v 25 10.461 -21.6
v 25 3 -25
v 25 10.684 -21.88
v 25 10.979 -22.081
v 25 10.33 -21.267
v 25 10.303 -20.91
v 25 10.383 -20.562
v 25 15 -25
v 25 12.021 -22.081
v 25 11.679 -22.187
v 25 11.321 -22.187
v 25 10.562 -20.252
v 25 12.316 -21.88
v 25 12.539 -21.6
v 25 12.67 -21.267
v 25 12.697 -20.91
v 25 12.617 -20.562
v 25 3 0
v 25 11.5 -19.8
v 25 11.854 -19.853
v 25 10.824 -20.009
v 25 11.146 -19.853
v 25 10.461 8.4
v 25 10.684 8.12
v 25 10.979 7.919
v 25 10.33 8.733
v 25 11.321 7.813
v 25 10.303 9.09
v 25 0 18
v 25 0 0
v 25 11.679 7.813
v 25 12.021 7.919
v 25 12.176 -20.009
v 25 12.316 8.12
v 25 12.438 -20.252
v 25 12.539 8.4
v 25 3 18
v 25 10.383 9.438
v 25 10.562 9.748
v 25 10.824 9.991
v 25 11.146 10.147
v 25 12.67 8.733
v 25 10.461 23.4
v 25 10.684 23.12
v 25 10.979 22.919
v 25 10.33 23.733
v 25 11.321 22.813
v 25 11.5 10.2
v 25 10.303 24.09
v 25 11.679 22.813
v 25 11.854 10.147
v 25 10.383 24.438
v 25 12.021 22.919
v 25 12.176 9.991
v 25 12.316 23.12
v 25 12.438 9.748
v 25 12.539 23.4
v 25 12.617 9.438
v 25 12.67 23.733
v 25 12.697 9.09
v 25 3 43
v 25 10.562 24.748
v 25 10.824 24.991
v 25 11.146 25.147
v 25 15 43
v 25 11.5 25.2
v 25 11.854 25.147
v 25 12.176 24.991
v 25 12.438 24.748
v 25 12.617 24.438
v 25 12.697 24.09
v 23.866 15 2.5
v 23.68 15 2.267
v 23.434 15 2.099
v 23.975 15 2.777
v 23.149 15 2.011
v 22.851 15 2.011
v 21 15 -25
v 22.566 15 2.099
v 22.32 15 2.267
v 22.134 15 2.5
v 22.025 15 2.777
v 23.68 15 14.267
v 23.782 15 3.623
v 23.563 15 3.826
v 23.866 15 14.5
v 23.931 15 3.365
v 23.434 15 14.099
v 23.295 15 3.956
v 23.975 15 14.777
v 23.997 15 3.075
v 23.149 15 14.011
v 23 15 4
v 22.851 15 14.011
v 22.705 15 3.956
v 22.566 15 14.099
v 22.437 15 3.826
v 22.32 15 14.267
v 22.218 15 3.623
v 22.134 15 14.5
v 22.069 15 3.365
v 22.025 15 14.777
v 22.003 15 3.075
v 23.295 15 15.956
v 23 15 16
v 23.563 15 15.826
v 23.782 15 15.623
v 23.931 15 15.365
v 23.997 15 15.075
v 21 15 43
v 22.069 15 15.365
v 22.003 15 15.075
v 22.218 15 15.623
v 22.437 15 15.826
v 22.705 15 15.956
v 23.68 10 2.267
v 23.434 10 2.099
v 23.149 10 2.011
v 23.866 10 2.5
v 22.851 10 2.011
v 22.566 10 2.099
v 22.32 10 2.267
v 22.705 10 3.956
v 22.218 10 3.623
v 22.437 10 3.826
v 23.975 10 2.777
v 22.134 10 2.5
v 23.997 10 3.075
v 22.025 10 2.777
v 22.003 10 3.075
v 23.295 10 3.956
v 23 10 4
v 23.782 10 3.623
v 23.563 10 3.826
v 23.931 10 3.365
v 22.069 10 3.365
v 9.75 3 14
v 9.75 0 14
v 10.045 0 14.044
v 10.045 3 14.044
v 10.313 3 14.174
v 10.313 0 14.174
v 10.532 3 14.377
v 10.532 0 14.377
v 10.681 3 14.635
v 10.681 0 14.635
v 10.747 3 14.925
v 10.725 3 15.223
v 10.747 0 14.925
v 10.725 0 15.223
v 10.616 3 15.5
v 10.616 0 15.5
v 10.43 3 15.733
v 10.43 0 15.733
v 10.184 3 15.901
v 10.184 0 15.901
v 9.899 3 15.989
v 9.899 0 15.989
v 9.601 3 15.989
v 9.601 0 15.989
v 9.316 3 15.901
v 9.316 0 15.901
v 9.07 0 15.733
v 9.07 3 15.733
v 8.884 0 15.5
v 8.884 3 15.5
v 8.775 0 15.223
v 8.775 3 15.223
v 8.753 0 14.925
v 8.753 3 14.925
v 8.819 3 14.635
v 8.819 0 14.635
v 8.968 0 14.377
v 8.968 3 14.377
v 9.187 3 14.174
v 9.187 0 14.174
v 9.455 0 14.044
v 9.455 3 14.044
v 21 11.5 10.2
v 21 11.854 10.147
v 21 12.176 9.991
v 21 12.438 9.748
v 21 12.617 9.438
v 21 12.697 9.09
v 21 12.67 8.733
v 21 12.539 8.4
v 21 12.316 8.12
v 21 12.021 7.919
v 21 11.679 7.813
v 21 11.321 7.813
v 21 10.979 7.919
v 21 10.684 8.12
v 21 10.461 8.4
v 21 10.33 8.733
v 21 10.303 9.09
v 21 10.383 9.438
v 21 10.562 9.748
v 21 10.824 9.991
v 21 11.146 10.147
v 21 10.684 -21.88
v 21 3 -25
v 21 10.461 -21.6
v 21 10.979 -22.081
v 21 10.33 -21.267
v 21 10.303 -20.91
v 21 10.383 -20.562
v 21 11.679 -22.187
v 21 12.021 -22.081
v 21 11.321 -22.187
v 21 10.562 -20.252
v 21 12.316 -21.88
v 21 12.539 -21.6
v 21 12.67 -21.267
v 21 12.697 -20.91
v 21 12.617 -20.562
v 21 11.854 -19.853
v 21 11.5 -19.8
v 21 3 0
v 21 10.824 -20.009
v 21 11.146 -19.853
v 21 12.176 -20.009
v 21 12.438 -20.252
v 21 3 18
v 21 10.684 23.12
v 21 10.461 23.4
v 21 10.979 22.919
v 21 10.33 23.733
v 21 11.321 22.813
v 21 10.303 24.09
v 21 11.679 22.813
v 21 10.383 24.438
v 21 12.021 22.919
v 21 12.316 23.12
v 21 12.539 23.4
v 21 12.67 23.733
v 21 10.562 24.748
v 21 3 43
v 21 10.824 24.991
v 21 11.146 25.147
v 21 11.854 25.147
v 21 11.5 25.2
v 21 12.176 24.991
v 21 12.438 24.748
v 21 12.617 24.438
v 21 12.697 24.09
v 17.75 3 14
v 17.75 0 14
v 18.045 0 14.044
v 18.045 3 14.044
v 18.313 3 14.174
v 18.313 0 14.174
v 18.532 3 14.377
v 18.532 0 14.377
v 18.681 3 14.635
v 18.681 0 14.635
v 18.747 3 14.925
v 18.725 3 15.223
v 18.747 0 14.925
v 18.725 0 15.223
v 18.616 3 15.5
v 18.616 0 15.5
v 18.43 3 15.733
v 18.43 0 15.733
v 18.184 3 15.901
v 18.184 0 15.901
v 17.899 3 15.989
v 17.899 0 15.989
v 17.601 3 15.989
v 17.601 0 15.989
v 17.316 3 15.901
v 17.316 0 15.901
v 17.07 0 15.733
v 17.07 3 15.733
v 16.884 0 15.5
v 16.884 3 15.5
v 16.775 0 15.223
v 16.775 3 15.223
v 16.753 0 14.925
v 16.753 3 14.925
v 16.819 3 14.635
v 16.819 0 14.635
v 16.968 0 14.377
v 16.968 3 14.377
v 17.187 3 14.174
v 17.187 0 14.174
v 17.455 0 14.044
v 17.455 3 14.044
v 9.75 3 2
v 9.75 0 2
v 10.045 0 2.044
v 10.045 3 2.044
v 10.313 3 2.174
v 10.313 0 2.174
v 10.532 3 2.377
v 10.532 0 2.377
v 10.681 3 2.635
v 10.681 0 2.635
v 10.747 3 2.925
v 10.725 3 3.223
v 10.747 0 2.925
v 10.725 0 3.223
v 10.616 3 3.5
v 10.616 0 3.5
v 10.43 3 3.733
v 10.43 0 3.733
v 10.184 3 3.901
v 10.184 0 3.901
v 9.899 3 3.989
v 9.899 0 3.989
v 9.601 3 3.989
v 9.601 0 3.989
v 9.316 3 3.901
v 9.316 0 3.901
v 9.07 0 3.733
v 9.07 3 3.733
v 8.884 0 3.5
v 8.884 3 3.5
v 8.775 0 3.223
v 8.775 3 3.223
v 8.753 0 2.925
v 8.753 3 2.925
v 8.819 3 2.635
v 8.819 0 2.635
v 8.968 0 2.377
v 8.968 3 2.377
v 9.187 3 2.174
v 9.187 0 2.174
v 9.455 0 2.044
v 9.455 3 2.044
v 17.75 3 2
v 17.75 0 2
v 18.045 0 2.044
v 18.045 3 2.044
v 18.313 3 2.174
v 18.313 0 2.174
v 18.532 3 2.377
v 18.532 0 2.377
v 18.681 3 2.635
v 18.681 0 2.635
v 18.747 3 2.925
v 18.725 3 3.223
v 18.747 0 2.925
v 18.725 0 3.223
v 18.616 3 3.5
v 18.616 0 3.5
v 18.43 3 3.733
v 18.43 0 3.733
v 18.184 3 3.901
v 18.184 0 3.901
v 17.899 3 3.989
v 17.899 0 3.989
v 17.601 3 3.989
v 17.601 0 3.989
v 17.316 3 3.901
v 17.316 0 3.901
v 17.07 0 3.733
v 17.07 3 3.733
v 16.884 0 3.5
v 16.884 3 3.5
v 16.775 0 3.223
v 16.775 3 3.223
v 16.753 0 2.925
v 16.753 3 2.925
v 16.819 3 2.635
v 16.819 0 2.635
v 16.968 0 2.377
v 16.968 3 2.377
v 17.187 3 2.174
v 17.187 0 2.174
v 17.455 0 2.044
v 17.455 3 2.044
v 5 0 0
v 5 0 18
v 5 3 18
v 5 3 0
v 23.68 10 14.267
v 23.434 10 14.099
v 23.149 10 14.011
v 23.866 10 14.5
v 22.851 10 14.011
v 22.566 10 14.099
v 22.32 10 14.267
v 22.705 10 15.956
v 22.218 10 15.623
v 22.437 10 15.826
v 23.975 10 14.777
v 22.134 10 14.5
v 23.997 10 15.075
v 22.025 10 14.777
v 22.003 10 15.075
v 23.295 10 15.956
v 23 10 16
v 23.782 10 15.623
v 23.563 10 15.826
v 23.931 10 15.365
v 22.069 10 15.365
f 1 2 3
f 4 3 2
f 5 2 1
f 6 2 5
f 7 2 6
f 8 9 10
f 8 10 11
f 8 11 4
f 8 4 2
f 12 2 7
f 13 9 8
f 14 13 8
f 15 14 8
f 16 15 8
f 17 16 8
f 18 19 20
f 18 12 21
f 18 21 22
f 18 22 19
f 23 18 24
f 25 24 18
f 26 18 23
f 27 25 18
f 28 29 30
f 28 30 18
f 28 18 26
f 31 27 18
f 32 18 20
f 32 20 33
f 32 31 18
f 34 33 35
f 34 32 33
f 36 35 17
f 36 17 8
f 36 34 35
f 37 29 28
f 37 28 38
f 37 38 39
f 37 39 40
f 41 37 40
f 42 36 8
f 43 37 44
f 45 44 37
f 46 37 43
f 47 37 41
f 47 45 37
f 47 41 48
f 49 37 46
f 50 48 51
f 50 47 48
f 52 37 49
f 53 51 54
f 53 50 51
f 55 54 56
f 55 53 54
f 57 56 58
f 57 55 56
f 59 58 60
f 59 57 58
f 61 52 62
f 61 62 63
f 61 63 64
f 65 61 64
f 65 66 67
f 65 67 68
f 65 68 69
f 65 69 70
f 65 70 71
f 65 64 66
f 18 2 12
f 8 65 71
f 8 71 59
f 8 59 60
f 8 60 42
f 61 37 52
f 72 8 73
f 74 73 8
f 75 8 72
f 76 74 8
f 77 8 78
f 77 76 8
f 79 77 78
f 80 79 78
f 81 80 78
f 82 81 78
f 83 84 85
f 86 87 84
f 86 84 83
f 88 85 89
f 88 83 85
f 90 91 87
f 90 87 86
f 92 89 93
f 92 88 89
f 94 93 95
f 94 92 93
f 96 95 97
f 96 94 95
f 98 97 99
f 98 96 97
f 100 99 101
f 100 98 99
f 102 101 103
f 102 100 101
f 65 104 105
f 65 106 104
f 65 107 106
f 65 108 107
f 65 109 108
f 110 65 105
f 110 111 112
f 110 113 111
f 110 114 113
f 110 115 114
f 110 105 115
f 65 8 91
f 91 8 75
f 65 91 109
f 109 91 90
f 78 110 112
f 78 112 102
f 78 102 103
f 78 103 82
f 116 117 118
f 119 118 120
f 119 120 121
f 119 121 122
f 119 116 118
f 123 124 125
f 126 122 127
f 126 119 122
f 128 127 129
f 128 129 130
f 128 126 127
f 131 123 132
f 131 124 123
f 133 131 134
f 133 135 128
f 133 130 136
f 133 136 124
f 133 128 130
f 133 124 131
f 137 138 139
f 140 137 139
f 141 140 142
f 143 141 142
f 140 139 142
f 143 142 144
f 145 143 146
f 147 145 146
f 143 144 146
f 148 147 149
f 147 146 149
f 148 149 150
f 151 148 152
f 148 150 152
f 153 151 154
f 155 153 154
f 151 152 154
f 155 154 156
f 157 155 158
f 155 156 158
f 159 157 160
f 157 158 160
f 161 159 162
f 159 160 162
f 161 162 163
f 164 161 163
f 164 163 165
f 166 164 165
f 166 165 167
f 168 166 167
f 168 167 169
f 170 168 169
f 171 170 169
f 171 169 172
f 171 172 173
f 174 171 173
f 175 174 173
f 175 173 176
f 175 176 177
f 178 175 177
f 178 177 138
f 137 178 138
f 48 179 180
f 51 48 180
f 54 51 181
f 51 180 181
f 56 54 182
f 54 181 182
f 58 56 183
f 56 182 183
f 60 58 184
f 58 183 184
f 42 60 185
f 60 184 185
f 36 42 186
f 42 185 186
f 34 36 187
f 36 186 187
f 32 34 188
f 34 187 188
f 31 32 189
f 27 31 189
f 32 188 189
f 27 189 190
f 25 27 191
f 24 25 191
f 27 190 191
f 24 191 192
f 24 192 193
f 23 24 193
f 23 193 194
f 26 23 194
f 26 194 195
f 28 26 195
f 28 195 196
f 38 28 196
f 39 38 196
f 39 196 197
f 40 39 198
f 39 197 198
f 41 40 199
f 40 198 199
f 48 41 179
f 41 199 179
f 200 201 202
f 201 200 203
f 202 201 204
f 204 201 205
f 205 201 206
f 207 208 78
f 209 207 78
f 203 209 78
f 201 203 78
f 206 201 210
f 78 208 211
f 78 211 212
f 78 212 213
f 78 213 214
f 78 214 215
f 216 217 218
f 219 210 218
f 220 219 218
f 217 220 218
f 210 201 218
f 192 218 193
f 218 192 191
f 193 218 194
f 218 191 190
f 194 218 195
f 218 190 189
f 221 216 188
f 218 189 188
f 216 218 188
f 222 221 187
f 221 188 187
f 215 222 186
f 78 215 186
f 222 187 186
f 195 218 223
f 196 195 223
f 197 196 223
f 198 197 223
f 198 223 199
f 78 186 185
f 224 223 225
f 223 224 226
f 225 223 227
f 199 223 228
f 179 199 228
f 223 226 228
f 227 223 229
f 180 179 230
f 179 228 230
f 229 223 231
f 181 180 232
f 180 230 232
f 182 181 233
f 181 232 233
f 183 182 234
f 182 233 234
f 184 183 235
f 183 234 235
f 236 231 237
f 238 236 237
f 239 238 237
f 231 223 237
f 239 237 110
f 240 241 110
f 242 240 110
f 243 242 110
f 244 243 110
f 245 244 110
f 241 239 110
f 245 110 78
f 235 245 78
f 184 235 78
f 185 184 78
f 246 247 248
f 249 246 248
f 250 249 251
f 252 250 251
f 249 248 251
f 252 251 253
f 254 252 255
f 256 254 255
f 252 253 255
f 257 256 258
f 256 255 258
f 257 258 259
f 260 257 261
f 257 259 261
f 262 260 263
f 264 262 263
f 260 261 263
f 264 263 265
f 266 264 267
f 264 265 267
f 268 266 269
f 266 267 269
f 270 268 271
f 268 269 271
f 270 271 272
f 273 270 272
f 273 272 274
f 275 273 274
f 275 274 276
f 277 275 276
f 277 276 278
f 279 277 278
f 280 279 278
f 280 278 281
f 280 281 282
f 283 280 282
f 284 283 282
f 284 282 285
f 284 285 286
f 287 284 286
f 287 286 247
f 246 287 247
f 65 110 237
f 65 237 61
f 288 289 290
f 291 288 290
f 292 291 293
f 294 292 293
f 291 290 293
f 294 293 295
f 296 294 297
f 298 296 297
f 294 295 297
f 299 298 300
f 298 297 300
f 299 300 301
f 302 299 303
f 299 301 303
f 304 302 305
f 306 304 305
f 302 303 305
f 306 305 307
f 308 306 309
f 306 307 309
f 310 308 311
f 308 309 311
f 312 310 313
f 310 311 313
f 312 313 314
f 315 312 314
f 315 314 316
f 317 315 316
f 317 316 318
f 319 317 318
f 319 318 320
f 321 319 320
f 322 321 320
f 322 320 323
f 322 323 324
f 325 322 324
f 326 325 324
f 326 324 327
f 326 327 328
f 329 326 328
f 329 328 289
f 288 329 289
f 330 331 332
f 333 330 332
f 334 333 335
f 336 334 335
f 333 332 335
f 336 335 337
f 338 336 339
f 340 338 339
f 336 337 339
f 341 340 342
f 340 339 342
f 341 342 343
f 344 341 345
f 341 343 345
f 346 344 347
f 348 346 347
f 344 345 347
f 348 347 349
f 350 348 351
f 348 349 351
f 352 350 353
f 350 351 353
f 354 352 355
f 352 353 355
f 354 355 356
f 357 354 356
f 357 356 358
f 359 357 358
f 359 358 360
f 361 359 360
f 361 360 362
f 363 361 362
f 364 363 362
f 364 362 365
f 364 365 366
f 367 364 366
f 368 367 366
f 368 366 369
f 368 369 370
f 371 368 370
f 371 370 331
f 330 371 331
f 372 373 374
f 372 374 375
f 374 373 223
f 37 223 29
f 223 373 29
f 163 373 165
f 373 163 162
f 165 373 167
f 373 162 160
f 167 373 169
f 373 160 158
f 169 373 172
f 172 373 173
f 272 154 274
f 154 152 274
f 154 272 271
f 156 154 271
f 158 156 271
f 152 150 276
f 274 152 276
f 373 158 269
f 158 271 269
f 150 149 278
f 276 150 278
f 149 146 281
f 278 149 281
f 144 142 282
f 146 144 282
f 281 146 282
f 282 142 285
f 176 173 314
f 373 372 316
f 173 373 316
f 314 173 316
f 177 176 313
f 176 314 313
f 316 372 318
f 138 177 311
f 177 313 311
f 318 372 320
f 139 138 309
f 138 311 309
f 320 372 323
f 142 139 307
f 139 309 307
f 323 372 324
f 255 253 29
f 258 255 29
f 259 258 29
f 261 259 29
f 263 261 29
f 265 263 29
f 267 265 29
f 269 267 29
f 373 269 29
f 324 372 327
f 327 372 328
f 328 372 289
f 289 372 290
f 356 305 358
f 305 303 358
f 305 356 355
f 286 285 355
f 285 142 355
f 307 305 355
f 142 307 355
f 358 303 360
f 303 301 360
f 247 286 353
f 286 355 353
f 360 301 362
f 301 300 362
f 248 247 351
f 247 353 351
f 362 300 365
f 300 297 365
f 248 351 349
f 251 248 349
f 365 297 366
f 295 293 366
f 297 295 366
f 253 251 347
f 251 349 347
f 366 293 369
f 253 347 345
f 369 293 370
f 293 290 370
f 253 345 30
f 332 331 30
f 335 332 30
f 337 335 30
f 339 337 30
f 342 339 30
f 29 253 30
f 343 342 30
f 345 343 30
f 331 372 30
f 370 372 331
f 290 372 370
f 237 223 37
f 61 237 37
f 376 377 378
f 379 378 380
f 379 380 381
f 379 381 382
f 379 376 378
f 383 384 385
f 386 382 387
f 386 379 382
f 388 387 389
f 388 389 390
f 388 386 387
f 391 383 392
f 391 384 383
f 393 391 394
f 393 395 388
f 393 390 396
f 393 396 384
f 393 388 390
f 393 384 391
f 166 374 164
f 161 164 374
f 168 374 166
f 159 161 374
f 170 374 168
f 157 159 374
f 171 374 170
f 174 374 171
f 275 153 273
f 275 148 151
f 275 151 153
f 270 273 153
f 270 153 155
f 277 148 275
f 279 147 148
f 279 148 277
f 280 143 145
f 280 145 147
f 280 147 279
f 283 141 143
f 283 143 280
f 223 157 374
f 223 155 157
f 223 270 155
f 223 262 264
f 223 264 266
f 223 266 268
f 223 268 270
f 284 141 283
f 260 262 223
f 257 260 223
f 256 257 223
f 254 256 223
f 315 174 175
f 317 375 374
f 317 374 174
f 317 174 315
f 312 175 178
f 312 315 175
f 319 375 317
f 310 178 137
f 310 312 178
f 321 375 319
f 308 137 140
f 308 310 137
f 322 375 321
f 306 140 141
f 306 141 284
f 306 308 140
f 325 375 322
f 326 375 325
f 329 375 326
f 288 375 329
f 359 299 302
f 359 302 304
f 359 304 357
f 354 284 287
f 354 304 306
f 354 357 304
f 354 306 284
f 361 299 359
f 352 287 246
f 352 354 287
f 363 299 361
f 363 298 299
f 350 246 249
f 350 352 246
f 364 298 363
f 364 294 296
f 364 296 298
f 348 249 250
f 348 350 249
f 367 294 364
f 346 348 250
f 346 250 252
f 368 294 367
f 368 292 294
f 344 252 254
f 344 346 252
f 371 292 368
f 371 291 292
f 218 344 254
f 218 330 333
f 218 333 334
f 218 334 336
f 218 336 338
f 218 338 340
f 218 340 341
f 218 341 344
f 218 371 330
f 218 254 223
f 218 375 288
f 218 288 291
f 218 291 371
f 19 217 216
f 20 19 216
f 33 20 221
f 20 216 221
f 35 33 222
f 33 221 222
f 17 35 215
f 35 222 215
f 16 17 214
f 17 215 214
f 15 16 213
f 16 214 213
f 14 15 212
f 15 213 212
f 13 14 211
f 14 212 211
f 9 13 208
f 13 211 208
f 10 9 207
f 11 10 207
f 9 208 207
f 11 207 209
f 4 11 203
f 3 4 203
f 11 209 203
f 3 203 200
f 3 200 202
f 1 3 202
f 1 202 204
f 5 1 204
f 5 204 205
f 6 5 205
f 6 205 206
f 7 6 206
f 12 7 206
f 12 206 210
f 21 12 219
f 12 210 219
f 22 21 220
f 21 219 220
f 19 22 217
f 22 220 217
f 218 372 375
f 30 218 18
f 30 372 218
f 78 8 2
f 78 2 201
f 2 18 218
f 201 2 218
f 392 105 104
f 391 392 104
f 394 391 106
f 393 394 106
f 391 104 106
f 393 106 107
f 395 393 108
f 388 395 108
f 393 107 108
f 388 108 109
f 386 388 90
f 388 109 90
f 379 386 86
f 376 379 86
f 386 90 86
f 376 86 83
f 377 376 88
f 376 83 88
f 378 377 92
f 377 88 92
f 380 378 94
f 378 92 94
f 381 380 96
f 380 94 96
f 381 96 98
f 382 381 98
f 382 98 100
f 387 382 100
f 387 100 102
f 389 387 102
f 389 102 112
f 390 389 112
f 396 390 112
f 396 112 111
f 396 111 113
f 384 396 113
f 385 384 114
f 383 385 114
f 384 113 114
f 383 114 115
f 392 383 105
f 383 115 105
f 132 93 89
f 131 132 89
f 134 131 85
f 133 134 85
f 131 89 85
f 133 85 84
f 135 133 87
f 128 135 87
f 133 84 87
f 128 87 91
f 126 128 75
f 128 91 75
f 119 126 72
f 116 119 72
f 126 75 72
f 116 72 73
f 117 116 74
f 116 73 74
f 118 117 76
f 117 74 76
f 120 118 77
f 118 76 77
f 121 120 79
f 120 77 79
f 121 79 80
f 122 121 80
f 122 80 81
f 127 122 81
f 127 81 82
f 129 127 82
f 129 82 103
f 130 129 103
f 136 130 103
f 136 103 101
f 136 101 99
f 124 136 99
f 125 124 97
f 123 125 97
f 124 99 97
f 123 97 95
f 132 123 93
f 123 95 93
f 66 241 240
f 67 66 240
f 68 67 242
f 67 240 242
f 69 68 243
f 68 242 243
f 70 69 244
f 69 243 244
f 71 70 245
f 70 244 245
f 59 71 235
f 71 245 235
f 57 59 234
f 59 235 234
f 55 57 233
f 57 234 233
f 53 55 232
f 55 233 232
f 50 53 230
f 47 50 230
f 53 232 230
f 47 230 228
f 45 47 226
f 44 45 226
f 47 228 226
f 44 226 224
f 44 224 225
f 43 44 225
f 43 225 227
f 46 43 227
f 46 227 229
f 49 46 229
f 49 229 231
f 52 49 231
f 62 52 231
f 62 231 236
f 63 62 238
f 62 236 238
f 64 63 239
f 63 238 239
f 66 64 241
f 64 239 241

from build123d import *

# Parameters (mm, degrees)
SKETCH_1_W          = 20
SKETCH_1_H          = 18
EXTRUDE_1_DEPTH     = 3
SKETCH_2_W          = 4
SKETCH_2_H          = 18
EXTRUDE_2_DEPTH     = 12
SKETCH_4_R          = 1
CUT_EXTRUDE_1_DEPTH = 35.263683398
SKETCH_5_R          = 1
CUT_EXTRUDE_2_DEPTH = 5
SKETCH_6_W          = 4
SKETCH_6_H          = 12
EXTRUDE_3_DEPTH     = 25
SKETCH_7_W          = 4
SKETCH_7_H          = 12
EXTRUDE_4_DEPTH     = 25
SKETCH_8_R          = 1.2
CUT_EXTRUDE_3_DEPTH = 4


with BuildPart() as part:
    # 草图1 → 凸台-拉伸1 (new body)
    with BuildSketch(Plane(origin=(0, 0, 0), x_dir=(1, 0, 0), z_dir=(0, 1, 0))):
        with Locations((15, -9)):
            Rectangle(SKETCH_1_W, SKETCH_1_H)
    extrude(amount=EXTRUDE_1_DEPTH)

    # 草图2 → 凸台-拉伸2 (add)
    with BuildSketch(Plane(origin=(0, 3, 0), x_dir=(1, 0, 0), z_dir=(0, 1, 0))):
        with Locations((23, -9)):
            Rectangle(SKETCH_2_W, SKETCH_2_H)
    extrude(amount=EXTRUDE_2_DEPTH)

    # 草图4 → 切除-拉伸1 (cut, through all)
    with BuildSketch(Plane.XZ):
        with Locations(Location((17.75, 15, 0), (0, 0, 270))):
            Circle(SKETCH_4_R)
        with Locations(Location((17.75, 3, 0), (0, 0, 270))):
            Circle(SKETCH_4_R)
        with Locations(Location((9.75, 3, 0), (0, 0, 270))):
            Circle(SKETCH_4_R)
        with Locations(Location((9.75, 15, 0), (0, 0, 270))):
            Circle(SKETCH_4_R)
    extrude(amount=-CUT_EXTRUDE_1_DEPTH, mode=Mode.SUBTRACT)

    # 草图5 → 切除-拉伸2 (cut)
    with BuildSketch(Plane(origin=(0, 15, 0), x_dir=(1, 0, 0), z_dir=(0, 1, 0))):
        with Locations(Location((23, -15, 0), (0, 0, 270))):
            Circle(SKETCH_5_R)
        with Locations(Location((23, -3, 0), (0, 0, 270))):
            Circle(SKETCH_5_R)
    extrude(amount=-CUT_EXTRUDE_2_DEPTH, mode=Mode.SUBTRACT)

    # 草图6 → 凸台-拉伸3 (add)
    with BuildSketch(Plane.XY.offset(18)):
        with Locations((23, 9)):
            Rectangle(SKETCH_6_W, SKETCH_6_H)
    extrude(amount=EXTRUDE_3_DEPTH)

    # 草图7 → 凸台-拉伸4 (add)
    with BuildSketch(Plane(origin=(0, 0, 0), x_dir=(-1, 0, 0), z_dir=(0, 0, -1))):
        with Locations((-23, 9)):
            Rectangle(SKETCH_7_W, SKETCH_7_H)
    extrude(amount=EXTRUDE_4_DEPTH)

    # 草图8 → 切除-拉伸3 (cut)
    with BuildSketch(Plane.ZY.offset(-21)):
        with Locations((-36, 11.5)):
            Circle(SKETCH_8_R)
        with Locations((-21, 11.5)):
            Circle(SKETCH_8_R)
        with Locations((9, 11.5)):
            Circle(SKETCH_8_R)
        with Locations((24, 11.5)):
            Circle(SKETCH_8_R)
    extrude(amount=-CUT_EXTRUDE_3_DEPTH, mode=Mode.SUBTRACT)


solid = part.part
